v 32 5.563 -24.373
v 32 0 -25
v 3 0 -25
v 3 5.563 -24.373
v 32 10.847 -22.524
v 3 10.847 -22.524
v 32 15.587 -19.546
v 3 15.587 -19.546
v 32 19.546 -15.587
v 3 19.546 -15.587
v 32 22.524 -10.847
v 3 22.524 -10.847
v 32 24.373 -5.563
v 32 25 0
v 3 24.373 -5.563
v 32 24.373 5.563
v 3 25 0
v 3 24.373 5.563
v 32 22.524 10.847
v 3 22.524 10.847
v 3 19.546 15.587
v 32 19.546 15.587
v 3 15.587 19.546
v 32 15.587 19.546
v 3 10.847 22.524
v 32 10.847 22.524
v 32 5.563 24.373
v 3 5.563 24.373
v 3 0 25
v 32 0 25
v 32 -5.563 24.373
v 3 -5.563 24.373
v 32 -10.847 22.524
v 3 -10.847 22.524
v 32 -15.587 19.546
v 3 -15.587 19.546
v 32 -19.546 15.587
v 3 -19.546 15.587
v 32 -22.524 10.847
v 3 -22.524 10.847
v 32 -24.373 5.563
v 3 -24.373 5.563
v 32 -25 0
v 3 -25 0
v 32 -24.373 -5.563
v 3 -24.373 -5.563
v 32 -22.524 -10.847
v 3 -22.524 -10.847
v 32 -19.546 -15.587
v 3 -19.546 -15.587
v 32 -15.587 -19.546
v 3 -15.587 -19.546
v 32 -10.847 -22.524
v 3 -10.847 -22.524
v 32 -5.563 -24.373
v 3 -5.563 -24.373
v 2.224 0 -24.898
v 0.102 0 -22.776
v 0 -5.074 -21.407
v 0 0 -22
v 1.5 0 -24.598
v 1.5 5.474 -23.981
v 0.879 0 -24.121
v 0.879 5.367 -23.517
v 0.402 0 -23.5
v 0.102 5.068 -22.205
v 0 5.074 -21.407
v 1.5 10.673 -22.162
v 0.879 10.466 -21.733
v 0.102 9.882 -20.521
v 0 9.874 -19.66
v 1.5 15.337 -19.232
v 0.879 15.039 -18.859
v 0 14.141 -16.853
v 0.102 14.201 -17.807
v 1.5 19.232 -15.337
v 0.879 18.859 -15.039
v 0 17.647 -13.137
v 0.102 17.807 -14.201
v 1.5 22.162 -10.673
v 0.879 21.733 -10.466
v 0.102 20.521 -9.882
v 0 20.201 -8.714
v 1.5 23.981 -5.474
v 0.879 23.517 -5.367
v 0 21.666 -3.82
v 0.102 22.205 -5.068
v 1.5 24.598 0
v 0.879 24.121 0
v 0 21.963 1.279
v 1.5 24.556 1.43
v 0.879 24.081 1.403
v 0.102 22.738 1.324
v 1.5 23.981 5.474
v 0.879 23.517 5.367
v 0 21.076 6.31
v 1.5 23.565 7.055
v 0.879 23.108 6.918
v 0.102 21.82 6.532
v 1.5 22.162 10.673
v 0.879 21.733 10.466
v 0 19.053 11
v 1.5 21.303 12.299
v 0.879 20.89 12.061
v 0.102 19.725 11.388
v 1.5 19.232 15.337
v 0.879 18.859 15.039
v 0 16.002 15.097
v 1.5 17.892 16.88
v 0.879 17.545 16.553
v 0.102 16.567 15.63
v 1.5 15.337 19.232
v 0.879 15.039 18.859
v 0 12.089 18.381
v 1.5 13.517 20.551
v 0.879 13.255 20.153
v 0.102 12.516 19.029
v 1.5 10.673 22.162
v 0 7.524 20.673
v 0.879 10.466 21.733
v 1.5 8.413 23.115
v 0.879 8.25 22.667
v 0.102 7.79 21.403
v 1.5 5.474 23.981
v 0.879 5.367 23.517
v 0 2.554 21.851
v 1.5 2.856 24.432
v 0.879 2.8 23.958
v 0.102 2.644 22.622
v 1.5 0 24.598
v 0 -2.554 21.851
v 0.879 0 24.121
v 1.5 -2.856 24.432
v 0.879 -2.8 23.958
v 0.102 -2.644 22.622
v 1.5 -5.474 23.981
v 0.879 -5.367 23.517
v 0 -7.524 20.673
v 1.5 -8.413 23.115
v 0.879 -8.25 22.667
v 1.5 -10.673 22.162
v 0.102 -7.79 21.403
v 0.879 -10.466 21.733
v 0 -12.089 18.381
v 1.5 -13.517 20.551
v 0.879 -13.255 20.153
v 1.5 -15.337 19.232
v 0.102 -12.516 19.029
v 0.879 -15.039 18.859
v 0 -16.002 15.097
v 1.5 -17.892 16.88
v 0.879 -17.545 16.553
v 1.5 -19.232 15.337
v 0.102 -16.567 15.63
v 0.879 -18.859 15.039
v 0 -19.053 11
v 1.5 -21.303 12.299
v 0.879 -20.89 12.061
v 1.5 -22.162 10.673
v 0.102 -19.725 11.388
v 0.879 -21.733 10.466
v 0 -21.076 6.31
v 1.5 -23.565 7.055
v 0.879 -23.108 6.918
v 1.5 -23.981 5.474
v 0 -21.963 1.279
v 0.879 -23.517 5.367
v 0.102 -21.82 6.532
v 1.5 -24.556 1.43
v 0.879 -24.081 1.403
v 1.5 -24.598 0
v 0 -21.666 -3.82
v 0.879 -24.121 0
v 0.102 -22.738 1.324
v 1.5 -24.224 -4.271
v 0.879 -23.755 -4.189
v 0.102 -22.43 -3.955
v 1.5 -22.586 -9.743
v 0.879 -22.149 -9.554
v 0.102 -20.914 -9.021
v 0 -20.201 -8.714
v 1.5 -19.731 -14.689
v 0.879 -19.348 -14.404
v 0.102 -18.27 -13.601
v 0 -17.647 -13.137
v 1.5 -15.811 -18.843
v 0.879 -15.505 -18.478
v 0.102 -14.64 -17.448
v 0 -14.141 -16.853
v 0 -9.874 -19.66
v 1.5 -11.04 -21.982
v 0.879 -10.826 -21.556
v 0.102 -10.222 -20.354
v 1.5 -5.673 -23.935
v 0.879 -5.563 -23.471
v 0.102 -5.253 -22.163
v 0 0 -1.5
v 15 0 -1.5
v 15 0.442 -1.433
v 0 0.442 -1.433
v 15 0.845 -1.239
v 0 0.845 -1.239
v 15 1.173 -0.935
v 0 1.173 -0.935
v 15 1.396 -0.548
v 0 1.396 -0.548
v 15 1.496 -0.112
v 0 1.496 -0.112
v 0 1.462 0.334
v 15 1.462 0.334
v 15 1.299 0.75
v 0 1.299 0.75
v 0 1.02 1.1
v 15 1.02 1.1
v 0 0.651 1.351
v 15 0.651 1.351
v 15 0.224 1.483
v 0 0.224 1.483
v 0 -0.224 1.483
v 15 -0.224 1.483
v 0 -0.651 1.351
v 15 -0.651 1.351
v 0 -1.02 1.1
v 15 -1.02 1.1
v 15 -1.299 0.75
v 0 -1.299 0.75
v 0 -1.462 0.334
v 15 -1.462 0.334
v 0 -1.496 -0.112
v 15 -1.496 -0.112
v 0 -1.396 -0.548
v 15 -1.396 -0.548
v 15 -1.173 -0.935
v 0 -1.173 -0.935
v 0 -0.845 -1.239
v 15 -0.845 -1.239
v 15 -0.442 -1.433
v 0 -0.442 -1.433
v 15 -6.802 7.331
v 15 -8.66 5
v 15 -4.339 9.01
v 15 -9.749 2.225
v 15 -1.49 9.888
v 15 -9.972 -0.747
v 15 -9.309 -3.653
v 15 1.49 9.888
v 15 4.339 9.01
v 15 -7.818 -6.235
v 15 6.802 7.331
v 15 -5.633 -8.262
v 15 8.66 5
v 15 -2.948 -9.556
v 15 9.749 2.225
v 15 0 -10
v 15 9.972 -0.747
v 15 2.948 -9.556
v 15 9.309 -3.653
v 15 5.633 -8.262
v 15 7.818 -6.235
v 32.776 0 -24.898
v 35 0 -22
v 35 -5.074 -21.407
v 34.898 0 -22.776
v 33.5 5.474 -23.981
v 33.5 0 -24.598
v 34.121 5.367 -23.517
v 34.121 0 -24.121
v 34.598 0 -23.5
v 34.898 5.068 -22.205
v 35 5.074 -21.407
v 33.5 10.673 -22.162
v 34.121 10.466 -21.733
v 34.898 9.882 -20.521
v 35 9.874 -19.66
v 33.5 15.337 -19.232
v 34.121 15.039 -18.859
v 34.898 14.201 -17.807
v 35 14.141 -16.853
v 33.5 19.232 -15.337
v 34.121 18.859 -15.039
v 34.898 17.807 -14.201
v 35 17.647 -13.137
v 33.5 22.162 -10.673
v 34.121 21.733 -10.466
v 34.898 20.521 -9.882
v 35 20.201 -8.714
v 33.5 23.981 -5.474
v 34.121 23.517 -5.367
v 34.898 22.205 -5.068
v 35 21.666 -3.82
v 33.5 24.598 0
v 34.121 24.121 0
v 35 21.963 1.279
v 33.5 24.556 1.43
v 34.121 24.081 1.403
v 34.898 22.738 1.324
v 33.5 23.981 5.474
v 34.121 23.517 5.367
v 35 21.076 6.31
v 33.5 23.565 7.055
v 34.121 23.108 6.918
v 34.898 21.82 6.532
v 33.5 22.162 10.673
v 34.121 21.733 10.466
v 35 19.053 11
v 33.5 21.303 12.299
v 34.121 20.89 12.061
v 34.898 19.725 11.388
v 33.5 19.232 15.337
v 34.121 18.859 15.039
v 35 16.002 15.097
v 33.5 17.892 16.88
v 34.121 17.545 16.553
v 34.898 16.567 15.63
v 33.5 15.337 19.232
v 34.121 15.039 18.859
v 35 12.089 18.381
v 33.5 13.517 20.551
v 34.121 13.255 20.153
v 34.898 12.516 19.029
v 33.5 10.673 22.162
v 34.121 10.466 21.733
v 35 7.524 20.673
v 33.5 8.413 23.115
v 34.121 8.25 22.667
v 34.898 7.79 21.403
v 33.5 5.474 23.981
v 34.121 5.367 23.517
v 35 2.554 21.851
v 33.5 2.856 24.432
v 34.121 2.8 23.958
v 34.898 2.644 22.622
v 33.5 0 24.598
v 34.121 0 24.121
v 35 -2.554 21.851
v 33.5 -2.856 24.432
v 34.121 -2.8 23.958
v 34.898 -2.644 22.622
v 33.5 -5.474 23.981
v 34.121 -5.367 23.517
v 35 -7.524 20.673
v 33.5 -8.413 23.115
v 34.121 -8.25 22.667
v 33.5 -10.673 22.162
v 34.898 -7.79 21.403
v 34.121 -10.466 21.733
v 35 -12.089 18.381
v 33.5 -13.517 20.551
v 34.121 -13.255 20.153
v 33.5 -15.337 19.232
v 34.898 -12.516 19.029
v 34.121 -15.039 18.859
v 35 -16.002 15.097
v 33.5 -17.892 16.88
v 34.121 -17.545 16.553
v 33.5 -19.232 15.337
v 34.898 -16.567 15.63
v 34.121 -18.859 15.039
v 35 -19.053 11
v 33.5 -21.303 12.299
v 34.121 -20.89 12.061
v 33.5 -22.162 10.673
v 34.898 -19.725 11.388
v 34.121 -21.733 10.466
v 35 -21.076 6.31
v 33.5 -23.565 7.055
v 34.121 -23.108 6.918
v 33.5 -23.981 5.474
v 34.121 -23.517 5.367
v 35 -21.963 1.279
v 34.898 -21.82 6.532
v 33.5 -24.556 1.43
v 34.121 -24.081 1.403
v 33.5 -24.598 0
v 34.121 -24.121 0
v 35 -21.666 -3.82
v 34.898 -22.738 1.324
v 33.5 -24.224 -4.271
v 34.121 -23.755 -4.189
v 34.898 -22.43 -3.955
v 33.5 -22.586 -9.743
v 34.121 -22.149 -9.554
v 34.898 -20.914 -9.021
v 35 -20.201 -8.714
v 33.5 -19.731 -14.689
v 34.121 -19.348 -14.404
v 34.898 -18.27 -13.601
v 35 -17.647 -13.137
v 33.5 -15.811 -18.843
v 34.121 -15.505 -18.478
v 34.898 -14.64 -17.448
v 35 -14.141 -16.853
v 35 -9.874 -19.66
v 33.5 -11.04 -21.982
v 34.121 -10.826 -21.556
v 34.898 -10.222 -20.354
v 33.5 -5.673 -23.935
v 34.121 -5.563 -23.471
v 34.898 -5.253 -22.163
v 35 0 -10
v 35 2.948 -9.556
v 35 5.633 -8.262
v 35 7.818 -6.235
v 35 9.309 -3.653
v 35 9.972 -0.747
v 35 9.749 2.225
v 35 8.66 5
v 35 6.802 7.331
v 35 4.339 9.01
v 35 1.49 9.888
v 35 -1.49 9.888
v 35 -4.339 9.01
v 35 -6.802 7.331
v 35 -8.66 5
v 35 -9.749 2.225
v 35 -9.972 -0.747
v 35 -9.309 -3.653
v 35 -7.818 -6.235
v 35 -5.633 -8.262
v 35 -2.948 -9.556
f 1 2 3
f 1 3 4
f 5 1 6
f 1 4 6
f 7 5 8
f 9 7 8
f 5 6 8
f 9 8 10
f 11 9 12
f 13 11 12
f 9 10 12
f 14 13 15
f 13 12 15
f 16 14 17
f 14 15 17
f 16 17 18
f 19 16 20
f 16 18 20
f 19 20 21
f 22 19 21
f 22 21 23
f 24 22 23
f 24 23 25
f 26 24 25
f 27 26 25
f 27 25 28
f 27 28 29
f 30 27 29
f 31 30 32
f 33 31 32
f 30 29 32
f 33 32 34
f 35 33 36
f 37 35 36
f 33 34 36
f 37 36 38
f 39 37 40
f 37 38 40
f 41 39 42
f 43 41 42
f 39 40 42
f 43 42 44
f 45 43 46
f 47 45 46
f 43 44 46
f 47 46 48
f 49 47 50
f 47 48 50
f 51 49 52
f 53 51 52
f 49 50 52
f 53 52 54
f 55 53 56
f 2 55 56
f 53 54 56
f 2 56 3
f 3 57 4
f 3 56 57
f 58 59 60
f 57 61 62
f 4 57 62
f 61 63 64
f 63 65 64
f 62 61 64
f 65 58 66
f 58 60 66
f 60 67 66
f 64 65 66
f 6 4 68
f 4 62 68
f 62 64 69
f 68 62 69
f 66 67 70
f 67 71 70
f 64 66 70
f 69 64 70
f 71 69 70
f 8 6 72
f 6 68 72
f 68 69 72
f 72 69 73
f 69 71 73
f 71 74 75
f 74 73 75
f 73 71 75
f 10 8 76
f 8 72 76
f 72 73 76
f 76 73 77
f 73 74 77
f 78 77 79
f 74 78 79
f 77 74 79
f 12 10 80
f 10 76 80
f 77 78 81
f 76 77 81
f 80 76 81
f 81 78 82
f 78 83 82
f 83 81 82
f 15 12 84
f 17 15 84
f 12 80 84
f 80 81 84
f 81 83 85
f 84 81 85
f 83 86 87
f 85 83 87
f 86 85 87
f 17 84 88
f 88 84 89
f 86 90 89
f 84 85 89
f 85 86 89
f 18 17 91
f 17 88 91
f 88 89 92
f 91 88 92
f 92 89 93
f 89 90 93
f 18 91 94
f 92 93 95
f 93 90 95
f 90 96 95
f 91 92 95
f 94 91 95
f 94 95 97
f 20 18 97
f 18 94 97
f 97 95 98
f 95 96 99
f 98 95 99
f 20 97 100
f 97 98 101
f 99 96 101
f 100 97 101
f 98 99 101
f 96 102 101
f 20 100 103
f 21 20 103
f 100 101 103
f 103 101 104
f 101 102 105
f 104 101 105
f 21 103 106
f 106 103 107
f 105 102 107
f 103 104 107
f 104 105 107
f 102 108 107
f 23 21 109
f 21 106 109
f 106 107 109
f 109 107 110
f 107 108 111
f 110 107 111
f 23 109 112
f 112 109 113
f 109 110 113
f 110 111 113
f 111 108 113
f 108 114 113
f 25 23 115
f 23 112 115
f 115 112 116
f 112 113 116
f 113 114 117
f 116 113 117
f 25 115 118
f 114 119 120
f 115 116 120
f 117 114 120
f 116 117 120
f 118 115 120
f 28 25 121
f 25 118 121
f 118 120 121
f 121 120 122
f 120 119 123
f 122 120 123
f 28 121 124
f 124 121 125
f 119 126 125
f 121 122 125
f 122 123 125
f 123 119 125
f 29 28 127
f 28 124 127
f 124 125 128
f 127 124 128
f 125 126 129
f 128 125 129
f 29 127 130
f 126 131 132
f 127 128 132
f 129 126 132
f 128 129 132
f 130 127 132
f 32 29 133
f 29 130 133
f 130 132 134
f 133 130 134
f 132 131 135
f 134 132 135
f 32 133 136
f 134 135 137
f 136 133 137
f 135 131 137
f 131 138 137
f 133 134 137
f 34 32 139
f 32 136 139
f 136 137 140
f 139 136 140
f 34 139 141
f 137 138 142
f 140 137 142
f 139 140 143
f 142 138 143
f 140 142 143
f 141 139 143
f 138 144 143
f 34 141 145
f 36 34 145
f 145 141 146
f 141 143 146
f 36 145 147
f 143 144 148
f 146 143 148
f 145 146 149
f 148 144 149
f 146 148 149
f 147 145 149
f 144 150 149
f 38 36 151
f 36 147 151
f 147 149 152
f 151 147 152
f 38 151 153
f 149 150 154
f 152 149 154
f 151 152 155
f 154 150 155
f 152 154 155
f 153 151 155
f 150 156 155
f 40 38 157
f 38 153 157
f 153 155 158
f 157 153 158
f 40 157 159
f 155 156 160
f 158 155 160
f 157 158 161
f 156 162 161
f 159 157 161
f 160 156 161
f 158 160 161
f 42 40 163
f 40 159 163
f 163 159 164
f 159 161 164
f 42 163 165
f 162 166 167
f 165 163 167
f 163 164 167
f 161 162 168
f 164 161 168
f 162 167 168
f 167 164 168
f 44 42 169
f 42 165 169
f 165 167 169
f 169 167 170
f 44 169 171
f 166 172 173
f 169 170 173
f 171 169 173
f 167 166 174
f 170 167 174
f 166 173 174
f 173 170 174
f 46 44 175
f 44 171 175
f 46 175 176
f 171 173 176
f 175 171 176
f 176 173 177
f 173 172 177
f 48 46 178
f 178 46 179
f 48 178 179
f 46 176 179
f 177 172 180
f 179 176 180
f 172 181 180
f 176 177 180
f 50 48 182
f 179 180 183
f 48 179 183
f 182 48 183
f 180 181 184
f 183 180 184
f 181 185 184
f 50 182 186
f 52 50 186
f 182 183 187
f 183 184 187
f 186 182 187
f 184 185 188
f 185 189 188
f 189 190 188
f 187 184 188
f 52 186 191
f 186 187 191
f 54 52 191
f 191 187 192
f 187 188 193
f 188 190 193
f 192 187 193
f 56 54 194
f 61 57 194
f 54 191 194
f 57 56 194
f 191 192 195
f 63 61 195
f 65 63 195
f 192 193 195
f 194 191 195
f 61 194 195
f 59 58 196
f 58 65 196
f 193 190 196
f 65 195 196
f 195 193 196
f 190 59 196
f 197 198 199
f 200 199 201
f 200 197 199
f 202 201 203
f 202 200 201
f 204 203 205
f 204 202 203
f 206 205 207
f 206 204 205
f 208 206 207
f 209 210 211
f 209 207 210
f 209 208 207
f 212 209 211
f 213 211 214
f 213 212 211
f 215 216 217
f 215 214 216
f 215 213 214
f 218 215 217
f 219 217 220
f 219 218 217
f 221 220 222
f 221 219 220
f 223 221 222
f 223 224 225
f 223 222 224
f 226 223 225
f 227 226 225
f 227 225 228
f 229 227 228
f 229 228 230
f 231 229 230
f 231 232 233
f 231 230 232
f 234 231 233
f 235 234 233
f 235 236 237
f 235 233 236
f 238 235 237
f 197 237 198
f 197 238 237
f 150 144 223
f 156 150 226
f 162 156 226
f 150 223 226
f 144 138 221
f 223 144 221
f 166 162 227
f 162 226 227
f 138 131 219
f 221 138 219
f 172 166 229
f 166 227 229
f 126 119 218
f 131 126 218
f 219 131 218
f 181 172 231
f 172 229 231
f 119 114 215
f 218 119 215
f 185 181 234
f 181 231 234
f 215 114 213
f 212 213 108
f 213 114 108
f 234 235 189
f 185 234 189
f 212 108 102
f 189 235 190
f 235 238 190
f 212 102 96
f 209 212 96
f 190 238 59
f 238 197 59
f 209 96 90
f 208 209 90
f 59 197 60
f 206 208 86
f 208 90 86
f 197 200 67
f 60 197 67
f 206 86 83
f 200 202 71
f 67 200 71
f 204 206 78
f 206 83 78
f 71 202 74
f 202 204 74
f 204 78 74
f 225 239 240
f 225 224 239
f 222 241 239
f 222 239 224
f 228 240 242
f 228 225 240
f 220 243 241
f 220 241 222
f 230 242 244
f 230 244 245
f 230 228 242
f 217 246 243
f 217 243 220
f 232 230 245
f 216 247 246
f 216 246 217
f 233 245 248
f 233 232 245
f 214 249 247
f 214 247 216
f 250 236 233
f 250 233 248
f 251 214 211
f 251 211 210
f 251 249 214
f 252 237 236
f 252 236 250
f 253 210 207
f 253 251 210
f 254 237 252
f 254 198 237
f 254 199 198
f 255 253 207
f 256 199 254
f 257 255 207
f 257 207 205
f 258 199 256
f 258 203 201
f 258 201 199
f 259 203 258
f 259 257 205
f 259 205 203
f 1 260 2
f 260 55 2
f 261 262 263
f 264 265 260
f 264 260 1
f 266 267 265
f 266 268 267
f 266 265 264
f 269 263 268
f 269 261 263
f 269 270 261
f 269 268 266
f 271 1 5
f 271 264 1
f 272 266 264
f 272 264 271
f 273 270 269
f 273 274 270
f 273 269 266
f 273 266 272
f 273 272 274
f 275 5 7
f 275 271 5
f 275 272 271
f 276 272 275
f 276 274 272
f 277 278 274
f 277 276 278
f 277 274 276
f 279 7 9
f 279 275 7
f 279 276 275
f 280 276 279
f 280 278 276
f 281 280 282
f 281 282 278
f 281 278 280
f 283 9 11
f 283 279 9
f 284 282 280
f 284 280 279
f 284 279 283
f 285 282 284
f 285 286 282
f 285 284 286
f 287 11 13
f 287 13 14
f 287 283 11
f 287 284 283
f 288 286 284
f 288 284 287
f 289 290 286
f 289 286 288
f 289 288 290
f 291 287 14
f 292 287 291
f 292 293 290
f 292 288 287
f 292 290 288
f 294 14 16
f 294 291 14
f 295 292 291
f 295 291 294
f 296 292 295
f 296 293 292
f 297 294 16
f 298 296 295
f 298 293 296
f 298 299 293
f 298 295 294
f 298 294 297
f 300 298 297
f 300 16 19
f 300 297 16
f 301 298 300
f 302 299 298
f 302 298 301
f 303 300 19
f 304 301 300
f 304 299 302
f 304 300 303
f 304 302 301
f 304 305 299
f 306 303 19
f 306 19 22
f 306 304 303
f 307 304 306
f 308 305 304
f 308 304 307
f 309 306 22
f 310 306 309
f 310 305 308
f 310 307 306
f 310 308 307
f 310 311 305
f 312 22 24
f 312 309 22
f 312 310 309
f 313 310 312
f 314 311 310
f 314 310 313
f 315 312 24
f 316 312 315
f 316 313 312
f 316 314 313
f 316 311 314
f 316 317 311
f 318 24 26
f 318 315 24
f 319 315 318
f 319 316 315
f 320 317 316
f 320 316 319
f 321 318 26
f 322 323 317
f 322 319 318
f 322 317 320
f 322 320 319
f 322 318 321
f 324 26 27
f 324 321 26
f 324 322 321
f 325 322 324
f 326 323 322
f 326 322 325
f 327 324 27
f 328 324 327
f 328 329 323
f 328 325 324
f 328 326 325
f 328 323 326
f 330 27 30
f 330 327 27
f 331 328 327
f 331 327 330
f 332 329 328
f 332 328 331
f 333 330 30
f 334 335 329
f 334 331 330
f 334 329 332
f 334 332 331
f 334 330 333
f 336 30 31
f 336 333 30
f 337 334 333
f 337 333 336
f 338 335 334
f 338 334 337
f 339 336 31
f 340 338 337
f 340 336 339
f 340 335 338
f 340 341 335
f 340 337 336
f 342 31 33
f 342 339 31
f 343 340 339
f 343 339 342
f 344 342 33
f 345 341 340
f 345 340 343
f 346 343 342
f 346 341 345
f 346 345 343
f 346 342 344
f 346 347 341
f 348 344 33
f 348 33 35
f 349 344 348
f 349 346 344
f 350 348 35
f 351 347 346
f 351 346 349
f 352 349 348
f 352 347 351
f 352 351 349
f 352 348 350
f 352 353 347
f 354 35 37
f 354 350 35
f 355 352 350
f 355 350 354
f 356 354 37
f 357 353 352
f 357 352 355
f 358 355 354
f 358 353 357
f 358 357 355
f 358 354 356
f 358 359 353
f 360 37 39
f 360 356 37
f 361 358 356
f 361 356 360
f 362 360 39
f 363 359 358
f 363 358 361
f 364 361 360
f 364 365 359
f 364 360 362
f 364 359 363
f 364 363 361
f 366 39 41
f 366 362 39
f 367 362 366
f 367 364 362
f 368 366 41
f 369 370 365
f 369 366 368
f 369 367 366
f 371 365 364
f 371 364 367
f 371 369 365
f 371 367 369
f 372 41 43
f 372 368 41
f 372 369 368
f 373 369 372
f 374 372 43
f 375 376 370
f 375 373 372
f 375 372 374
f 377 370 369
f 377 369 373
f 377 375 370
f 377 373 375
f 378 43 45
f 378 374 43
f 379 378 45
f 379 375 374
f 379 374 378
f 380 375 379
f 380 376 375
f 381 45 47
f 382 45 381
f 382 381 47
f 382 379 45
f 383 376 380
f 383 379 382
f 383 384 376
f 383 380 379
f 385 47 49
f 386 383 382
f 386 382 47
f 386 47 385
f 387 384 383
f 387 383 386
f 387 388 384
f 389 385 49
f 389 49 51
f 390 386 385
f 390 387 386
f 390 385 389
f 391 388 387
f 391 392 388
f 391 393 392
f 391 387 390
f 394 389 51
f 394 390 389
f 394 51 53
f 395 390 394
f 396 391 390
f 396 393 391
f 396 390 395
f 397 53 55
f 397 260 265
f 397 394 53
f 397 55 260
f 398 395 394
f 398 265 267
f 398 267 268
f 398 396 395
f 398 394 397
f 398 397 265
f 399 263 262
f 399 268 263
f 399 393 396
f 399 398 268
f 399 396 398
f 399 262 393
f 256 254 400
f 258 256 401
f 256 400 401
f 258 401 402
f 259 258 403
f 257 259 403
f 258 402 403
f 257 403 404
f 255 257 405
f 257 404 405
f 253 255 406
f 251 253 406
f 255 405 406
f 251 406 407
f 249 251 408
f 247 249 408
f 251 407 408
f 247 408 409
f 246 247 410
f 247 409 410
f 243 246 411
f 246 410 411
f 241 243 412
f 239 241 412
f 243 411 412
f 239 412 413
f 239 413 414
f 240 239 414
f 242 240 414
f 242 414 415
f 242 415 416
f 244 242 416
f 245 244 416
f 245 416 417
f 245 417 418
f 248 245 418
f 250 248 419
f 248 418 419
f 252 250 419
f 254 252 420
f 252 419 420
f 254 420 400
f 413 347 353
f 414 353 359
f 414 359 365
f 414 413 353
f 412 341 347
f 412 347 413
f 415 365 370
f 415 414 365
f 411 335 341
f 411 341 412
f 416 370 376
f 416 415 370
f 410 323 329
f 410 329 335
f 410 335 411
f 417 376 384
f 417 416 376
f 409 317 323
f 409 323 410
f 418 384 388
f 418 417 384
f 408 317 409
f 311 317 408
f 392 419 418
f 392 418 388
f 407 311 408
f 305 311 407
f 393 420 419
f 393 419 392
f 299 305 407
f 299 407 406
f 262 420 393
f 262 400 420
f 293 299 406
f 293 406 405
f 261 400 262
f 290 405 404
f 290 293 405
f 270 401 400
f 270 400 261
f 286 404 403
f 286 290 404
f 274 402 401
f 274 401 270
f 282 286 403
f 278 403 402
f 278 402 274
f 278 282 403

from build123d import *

# Parameters (mm, degrees)
SKETCH1_R           = 25
SKETCH1_R_2         = 1.5
BOSS_EXTRUDE1_DEPTH = 35
SKETCH2_R           = 10
CUT_EXTRUDE1_DEPTH  = 20
FILLET2_R           = 3
FILLET3_R           = 3


with BuildPart() as part:
    # Sketch1 → Boss-Extrude1 (new body)
    with BuildSketch(Plane.YZ):
        with Locations(Location((0, 0, 0), (0, 0, 270))):
            Circle(SKETCH1_R)
        with Locations(Location((0, 0, 0), (0, 0, 270))):
            Circle(SKETCH1_R_2, mode=Mode.SUBTRACT)
    extrude(amount=BOSS_EXTRUDE1_DEPTH)

    # Sketch2 → Cut-Extrude1 (cut)
    with BuildSketch(Plane.YZ.offset(35)):
        with Locations(Location((0, 0, 0), (0, 0, 270))):
            Circle(SKETCH2_R)
    extrude(amount=-CUT_EXTRUDE1_DEPTH, mode=Mode.SUBTRACT)

    # Fillet2
    fillet2_edges = [part.edges().sort_by_distance(p)[0] for p in [
        (0, 0, 25),
    ]]
    fillet(fillet2_edges, radius=FILLET2_R)

    # Fillet3
    fillet3_edges = [part.edges().sort_by_distance(p)[0] for p in [
        (35, 0, 25),
    ]]
    fillet(fillet3_edges, radius=FILLET3_R)


solid = part.part
